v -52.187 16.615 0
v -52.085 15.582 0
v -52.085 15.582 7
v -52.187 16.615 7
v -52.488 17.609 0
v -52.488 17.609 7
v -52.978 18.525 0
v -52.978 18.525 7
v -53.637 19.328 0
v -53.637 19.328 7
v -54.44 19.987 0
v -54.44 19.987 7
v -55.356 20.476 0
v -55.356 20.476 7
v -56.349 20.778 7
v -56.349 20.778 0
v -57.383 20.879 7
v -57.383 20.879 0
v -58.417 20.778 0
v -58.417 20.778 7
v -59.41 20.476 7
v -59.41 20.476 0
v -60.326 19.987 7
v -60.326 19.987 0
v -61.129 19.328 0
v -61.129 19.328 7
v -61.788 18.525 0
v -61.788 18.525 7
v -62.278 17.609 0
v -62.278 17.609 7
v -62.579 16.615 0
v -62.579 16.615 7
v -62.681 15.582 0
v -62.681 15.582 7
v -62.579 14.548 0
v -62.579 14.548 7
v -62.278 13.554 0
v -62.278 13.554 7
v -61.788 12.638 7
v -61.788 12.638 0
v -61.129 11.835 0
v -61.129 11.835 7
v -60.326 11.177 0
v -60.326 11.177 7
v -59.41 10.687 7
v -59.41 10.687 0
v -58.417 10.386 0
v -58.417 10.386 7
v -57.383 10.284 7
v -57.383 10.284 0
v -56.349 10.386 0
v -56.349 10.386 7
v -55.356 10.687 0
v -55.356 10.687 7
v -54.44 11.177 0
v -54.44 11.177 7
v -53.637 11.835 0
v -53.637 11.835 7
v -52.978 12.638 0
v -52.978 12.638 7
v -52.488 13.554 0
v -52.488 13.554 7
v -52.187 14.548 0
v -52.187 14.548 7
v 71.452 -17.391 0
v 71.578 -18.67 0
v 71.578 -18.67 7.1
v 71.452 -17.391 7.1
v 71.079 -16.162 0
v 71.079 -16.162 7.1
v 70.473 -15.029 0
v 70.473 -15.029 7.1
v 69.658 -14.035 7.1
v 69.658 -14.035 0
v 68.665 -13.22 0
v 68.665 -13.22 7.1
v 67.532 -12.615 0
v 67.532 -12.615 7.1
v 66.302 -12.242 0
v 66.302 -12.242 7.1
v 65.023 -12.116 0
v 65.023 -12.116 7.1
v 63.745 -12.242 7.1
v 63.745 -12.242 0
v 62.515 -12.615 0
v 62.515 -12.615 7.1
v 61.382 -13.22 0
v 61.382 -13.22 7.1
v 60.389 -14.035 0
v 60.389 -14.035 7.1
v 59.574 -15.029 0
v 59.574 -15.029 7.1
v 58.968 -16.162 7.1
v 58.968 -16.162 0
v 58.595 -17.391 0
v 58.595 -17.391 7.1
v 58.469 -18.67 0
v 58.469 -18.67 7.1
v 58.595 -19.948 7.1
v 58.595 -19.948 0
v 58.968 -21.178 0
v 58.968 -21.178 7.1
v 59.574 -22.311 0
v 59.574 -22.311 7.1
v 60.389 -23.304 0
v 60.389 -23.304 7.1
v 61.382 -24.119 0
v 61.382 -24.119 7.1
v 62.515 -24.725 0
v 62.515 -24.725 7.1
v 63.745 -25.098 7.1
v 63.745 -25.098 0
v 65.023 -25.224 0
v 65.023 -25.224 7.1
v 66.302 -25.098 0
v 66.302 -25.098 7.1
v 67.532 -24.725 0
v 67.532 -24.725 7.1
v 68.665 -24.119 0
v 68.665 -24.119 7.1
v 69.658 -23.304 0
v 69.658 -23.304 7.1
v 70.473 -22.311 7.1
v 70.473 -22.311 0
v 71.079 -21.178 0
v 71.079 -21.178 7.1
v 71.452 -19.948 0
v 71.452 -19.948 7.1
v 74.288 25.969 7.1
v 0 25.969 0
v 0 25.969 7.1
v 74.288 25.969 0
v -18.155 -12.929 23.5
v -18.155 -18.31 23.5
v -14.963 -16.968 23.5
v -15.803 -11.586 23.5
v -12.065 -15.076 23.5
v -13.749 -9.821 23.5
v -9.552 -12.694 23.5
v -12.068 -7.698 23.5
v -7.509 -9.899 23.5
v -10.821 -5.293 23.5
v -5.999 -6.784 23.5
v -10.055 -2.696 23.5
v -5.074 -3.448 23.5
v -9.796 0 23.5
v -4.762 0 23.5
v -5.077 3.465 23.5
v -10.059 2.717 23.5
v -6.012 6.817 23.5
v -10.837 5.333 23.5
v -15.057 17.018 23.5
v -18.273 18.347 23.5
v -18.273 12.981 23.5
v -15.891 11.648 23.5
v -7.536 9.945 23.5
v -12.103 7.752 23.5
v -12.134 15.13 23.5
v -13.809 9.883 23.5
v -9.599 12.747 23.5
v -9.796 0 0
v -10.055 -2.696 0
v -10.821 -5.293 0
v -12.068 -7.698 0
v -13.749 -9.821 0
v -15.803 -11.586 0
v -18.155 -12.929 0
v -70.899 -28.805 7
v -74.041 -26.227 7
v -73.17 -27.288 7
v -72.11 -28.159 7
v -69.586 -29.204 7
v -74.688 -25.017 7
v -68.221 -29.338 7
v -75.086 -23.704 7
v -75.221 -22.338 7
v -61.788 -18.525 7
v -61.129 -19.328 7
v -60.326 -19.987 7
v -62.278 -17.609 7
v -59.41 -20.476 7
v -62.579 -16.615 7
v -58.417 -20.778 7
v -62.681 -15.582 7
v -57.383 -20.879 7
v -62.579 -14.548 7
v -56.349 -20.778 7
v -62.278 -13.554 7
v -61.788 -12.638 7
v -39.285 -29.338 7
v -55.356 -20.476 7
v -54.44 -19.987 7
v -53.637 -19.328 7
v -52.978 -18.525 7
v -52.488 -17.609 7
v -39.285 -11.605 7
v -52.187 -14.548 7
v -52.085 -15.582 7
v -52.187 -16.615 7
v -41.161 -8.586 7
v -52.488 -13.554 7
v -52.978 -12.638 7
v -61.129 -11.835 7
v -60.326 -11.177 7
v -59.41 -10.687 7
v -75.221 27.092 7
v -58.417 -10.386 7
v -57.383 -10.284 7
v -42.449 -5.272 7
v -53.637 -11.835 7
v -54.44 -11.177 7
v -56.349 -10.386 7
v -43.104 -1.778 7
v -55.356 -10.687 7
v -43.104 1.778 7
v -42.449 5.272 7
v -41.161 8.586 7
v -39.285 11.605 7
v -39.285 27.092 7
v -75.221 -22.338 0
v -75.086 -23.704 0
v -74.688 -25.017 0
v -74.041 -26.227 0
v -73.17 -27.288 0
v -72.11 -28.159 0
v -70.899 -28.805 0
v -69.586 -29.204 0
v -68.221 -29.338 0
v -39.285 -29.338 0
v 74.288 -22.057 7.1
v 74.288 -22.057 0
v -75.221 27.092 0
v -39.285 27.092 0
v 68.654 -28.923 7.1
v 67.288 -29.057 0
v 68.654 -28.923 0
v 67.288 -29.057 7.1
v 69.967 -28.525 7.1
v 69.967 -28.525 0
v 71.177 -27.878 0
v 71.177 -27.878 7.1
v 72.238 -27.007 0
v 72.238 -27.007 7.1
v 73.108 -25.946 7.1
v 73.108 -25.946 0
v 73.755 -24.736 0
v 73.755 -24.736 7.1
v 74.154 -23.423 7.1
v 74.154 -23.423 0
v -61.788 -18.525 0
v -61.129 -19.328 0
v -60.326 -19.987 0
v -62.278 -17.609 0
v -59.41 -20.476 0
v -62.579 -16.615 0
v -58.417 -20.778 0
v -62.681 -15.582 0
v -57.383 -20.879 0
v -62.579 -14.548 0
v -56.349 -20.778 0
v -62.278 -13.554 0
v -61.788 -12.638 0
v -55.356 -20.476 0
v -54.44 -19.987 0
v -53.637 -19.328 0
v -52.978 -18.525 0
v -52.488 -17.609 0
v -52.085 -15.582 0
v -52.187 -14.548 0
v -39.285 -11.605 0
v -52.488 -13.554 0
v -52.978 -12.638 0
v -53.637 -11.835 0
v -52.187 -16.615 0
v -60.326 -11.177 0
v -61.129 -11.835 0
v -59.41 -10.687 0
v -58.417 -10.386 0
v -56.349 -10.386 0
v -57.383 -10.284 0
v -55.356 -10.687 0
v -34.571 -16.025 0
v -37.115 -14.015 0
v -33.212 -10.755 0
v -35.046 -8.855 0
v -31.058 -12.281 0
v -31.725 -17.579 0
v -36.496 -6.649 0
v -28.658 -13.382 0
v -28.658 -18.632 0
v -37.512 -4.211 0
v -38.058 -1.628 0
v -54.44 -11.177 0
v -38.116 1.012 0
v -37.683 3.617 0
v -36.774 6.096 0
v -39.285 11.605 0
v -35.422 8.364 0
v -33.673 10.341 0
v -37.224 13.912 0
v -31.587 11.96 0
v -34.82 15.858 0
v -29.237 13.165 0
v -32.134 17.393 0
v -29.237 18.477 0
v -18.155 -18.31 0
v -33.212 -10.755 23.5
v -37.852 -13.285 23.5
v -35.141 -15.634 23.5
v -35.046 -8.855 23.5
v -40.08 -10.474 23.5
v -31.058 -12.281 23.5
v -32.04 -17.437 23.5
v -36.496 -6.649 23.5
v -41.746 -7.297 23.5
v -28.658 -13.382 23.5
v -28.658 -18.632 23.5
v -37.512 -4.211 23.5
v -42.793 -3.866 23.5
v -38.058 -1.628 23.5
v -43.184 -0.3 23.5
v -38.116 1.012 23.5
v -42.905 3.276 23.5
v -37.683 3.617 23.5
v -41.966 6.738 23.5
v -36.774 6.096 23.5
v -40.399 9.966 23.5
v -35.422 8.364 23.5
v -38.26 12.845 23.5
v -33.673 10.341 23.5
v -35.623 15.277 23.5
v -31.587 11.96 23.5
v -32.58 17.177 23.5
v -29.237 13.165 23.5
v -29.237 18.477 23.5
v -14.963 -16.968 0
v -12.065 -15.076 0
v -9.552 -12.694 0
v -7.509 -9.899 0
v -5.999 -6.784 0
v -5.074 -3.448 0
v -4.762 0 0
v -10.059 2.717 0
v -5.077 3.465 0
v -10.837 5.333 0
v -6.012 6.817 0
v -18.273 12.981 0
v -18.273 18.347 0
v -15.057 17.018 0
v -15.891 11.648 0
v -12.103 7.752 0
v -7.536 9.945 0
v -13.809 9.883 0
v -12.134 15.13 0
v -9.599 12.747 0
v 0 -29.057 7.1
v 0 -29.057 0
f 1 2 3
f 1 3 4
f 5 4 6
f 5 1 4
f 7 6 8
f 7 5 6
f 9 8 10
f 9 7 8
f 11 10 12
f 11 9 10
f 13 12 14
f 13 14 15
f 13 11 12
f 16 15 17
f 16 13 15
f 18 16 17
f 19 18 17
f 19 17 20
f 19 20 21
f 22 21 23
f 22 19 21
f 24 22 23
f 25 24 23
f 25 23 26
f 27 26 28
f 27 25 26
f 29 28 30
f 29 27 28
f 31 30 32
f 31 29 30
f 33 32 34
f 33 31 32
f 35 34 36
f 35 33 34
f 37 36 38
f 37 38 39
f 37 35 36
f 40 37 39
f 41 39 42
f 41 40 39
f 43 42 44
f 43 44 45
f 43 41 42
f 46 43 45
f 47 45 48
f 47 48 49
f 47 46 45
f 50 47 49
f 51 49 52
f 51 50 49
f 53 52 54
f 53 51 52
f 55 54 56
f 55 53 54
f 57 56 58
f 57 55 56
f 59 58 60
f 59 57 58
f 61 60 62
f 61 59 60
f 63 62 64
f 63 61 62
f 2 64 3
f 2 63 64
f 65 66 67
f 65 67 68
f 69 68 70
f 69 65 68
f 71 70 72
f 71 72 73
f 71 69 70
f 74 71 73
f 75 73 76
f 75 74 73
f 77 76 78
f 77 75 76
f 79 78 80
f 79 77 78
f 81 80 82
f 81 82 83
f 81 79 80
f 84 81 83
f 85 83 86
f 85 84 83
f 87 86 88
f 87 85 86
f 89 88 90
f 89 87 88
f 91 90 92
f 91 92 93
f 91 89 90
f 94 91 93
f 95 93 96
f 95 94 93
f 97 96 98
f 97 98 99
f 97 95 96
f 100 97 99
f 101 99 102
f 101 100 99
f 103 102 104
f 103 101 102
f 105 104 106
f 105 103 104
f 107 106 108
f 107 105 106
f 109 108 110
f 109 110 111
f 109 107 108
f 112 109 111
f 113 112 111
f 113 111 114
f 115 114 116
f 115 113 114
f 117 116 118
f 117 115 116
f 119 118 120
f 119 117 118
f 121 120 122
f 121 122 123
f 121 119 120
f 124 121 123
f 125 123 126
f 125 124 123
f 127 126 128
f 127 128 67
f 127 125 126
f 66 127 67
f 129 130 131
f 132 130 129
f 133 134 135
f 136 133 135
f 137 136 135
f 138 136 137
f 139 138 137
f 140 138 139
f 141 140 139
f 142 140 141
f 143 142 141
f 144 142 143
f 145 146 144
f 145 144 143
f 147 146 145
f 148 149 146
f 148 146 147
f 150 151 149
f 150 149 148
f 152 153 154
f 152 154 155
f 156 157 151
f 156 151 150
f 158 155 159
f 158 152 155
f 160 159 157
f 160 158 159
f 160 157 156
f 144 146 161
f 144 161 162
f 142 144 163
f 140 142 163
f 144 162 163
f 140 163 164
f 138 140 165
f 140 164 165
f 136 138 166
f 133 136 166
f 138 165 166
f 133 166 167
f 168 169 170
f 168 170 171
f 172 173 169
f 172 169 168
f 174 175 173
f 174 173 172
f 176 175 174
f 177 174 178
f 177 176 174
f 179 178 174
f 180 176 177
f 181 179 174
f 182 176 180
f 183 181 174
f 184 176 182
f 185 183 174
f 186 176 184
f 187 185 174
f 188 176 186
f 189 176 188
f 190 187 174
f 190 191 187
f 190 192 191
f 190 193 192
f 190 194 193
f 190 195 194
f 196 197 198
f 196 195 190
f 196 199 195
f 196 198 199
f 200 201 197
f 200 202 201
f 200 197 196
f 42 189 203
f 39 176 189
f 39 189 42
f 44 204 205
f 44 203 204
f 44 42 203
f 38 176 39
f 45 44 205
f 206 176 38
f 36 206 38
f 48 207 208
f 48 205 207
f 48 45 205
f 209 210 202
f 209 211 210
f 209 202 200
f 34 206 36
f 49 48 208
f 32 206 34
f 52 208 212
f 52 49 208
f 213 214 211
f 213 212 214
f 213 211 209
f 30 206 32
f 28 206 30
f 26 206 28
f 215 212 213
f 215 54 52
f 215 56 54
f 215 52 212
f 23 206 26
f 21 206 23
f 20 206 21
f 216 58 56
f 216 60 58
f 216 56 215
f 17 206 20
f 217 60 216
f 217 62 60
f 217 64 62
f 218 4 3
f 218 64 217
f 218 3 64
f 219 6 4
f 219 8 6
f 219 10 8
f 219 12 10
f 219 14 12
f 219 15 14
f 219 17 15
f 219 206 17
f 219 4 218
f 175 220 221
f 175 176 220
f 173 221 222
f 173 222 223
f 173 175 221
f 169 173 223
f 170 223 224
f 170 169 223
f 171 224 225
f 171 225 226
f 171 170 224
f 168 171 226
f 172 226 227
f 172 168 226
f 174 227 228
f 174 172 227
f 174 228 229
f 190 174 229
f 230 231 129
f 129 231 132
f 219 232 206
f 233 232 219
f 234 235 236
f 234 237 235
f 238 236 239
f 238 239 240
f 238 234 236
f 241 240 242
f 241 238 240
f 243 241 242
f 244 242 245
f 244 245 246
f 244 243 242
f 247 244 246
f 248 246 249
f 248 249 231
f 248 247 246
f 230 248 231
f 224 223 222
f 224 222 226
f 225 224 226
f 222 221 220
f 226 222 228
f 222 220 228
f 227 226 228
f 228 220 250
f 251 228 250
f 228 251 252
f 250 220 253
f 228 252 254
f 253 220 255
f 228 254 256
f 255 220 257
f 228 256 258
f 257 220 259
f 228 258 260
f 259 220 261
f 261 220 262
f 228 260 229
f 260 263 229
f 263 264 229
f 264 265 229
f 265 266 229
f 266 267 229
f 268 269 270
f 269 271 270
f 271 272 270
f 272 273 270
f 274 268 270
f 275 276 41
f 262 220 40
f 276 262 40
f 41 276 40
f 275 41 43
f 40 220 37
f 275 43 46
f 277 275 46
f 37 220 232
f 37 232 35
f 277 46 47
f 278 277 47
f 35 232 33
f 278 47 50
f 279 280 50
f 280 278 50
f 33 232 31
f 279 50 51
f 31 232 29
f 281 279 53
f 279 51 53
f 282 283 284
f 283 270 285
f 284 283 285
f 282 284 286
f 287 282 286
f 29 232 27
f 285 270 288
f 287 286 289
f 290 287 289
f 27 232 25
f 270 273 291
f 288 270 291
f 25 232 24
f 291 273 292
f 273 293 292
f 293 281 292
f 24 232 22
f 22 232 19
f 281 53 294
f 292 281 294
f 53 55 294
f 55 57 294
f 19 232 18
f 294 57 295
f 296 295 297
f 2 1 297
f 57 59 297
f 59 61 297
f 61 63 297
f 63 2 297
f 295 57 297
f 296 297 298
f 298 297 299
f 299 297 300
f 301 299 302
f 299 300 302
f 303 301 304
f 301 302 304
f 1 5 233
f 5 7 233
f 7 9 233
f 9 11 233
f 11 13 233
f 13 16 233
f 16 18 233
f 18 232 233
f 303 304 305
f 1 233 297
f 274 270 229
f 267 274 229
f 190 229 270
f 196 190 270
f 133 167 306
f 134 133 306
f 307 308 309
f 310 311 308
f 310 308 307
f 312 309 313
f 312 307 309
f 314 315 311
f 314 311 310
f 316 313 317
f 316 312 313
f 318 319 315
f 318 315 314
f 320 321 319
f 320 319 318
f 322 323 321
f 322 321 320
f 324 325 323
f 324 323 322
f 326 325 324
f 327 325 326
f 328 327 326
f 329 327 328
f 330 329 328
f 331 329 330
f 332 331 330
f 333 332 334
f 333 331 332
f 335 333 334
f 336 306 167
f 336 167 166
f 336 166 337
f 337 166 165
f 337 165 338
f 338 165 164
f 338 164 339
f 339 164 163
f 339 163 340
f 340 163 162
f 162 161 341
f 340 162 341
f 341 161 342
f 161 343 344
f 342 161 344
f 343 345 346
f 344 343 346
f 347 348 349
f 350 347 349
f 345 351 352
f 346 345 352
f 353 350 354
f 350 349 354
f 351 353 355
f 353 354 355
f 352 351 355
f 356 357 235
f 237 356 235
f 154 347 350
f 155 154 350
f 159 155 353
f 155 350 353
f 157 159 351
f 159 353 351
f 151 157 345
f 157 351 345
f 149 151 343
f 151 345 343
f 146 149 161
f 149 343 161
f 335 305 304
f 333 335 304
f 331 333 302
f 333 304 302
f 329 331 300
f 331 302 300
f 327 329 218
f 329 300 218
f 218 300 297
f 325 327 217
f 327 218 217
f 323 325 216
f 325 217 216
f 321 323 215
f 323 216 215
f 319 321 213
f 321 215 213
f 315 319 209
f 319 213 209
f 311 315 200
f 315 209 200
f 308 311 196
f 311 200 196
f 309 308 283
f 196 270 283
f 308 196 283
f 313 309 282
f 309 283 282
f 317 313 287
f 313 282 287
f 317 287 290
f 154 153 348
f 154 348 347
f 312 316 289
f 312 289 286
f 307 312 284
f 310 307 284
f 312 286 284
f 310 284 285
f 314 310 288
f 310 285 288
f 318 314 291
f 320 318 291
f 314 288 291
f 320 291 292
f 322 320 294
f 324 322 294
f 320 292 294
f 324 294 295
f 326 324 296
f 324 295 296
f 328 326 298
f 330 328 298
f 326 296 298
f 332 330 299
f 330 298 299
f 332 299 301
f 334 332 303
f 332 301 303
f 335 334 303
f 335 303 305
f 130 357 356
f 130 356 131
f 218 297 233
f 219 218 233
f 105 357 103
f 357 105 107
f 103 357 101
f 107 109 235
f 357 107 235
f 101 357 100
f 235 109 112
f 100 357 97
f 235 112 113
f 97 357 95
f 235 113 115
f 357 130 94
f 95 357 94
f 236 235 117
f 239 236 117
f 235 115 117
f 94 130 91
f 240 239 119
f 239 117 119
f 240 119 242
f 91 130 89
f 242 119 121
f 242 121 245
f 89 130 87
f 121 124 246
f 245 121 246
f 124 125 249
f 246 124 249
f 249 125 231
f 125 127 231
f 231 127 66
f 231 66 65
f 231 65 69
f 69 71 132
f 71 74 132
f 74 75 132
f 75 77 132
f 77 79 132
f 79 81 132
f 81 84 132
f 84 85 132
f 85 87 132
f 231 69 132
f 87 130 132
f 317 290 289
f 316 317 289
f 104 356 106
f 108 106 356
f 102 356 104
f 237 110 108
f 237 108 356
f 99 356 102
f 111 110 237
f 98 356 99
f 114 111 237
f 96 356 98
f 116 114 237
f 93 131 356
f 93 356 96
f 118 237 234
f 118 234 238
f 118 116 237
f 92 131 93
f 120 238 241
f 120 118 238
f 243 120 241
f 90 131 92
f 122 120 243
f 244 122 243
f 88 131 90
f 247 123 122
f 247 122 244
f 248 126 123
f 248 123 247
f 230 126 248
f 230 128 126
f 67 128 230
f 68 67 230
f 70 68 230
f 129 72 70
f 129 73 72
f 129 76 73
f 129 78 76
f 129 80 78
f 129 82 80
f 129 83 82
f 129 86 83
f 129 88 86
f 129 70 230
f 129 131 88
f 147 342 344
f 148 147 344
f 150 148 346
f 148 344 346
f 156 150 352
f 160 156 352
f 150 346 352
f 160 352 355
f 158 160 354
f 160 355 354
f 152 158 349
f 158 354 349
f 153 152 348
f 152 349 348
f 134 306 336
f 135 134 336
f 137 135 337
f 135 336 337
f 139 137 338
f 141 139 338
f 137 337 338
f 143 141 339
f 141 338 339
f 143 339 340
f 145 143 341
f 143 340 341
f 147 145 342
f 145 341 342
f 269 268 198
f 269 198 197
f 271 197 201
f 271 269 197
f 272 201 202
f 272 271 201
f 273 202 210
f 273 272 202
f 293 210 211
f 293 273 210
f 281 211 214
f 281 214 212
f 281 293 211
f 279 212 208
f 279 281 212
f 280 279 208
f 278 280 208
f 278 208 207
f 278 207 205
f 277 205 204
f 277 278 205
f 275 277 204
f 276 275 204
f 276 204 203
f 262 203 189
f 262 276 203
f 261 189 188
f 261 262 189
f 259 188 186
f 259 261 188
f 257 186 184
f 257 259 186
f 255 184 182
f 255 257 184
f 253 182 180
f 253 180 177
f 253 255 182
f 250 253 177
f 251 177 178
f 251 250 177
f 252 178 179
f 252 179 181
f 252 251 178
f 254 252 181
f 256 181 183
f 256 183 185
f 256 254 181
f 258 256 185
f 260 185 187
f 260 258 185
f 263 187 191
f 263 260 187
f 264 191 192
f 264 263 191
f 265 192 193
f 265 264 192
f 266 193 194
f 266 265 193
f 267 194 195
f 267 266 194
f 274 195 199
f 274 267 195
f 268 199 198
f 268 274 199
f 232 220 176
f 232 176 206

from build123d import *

# Parameters (mm, degrees)
F0_W     = 35.93583
F0_H     = 56.430485
F0_R     = 5.297828
F1_DEPTH = 7
F2_R     = 7
F4_DEPTH = 23.5
F5_W     = 74.2881
F5_H     = 55.02674
F5_R     = 6.554145
F6_DEPTH = 7.1
F7_R     = 7


with BuildPart() as f1:
    # F0 (on Top) → F1 (new body)
    with BuildSketch(Plane.XY):
        with Locations((-57.252677, -1.122995)):
            Rectangle(F0_W, F0_H)
        with Locations((-57.383023, -15.581551)):
            Circle(F0_R, mode=Mode.SUBTRACT)
        with Locations((-57.383023, 15.581551)):
            Circle(F0_R, mode=Mode.SUBTRACT)
    extrude(amount=F1_DEPTH)

    # F2
    f2_edges = [f1.edges().sort_by_distance(p)[0] for p in [
        (-75.220592, -29.338237, 3.5),
    ]]
    fillet(f2_edges, radius=F2_R)

    # F3 (on Top) → F4 (join)
    with BuildSketch(Plane.XY):
        with BuildLine():
            Line((-29.237198, 13.16466), (-29.237198, 18.477073))
            ThreePointArc((-29.237198, 18.477073), (-43.183676, -0.299966), (-28.657722, -18.6324))
            Line((-28.657722, -18.6324), (-28.657722, -13.381791))
            ThreePointArc((-28.657722, -13.381791), (-38.148363, -0.30941), (-29.237198, 13.16466))
        make_face()
        with BuildLine():
            ThreePointArc((-18.15487, -18.309635), (-8.467474, -11.342572), (-4.761848, 0))
            ThreePointArc((-4.761848, 0), (-8.504096, 11.392469), (-18.272964, 18.346748))
            Line((-18.272964, 18.346748), (-18.272964, 12.981109))
            ThreePointArc((-18.272964, 12.981109), (-12.103013, 7.751871), (-9.796125, 0))
            ThreePointArc((-9.796125, 0), (-12.067804, -7.697684), (-18.15487, -12.928602))
            Line((-18.15487, -12.928602), (-18.15487, -18.309635))
        make_face()
    extrude(amount=F4_DEPTH)


with BuildPart() as f6:
    # F5 (on Top) → F6 (new body)
    with BuildSketch(Plane.XY):
        with Locations((37.14405, -1.544118)):
            Rectangle(F5_W, F5_H)
        with Locations((65.0234, -18.669788)):
            Circle(F5_R, mode=Mode.SUBTRACT)
    extrude(amount=F6_DEPTH)

    # F7
    f7_edges = [f6.edges().sort_by_distance(p)[0] for p in [
        (74.2881, -29.057488, 3.55),
    ]]
    fillet(f7_edges, radius=F7_R)


solid = Compound([f1.part, f6.part])
